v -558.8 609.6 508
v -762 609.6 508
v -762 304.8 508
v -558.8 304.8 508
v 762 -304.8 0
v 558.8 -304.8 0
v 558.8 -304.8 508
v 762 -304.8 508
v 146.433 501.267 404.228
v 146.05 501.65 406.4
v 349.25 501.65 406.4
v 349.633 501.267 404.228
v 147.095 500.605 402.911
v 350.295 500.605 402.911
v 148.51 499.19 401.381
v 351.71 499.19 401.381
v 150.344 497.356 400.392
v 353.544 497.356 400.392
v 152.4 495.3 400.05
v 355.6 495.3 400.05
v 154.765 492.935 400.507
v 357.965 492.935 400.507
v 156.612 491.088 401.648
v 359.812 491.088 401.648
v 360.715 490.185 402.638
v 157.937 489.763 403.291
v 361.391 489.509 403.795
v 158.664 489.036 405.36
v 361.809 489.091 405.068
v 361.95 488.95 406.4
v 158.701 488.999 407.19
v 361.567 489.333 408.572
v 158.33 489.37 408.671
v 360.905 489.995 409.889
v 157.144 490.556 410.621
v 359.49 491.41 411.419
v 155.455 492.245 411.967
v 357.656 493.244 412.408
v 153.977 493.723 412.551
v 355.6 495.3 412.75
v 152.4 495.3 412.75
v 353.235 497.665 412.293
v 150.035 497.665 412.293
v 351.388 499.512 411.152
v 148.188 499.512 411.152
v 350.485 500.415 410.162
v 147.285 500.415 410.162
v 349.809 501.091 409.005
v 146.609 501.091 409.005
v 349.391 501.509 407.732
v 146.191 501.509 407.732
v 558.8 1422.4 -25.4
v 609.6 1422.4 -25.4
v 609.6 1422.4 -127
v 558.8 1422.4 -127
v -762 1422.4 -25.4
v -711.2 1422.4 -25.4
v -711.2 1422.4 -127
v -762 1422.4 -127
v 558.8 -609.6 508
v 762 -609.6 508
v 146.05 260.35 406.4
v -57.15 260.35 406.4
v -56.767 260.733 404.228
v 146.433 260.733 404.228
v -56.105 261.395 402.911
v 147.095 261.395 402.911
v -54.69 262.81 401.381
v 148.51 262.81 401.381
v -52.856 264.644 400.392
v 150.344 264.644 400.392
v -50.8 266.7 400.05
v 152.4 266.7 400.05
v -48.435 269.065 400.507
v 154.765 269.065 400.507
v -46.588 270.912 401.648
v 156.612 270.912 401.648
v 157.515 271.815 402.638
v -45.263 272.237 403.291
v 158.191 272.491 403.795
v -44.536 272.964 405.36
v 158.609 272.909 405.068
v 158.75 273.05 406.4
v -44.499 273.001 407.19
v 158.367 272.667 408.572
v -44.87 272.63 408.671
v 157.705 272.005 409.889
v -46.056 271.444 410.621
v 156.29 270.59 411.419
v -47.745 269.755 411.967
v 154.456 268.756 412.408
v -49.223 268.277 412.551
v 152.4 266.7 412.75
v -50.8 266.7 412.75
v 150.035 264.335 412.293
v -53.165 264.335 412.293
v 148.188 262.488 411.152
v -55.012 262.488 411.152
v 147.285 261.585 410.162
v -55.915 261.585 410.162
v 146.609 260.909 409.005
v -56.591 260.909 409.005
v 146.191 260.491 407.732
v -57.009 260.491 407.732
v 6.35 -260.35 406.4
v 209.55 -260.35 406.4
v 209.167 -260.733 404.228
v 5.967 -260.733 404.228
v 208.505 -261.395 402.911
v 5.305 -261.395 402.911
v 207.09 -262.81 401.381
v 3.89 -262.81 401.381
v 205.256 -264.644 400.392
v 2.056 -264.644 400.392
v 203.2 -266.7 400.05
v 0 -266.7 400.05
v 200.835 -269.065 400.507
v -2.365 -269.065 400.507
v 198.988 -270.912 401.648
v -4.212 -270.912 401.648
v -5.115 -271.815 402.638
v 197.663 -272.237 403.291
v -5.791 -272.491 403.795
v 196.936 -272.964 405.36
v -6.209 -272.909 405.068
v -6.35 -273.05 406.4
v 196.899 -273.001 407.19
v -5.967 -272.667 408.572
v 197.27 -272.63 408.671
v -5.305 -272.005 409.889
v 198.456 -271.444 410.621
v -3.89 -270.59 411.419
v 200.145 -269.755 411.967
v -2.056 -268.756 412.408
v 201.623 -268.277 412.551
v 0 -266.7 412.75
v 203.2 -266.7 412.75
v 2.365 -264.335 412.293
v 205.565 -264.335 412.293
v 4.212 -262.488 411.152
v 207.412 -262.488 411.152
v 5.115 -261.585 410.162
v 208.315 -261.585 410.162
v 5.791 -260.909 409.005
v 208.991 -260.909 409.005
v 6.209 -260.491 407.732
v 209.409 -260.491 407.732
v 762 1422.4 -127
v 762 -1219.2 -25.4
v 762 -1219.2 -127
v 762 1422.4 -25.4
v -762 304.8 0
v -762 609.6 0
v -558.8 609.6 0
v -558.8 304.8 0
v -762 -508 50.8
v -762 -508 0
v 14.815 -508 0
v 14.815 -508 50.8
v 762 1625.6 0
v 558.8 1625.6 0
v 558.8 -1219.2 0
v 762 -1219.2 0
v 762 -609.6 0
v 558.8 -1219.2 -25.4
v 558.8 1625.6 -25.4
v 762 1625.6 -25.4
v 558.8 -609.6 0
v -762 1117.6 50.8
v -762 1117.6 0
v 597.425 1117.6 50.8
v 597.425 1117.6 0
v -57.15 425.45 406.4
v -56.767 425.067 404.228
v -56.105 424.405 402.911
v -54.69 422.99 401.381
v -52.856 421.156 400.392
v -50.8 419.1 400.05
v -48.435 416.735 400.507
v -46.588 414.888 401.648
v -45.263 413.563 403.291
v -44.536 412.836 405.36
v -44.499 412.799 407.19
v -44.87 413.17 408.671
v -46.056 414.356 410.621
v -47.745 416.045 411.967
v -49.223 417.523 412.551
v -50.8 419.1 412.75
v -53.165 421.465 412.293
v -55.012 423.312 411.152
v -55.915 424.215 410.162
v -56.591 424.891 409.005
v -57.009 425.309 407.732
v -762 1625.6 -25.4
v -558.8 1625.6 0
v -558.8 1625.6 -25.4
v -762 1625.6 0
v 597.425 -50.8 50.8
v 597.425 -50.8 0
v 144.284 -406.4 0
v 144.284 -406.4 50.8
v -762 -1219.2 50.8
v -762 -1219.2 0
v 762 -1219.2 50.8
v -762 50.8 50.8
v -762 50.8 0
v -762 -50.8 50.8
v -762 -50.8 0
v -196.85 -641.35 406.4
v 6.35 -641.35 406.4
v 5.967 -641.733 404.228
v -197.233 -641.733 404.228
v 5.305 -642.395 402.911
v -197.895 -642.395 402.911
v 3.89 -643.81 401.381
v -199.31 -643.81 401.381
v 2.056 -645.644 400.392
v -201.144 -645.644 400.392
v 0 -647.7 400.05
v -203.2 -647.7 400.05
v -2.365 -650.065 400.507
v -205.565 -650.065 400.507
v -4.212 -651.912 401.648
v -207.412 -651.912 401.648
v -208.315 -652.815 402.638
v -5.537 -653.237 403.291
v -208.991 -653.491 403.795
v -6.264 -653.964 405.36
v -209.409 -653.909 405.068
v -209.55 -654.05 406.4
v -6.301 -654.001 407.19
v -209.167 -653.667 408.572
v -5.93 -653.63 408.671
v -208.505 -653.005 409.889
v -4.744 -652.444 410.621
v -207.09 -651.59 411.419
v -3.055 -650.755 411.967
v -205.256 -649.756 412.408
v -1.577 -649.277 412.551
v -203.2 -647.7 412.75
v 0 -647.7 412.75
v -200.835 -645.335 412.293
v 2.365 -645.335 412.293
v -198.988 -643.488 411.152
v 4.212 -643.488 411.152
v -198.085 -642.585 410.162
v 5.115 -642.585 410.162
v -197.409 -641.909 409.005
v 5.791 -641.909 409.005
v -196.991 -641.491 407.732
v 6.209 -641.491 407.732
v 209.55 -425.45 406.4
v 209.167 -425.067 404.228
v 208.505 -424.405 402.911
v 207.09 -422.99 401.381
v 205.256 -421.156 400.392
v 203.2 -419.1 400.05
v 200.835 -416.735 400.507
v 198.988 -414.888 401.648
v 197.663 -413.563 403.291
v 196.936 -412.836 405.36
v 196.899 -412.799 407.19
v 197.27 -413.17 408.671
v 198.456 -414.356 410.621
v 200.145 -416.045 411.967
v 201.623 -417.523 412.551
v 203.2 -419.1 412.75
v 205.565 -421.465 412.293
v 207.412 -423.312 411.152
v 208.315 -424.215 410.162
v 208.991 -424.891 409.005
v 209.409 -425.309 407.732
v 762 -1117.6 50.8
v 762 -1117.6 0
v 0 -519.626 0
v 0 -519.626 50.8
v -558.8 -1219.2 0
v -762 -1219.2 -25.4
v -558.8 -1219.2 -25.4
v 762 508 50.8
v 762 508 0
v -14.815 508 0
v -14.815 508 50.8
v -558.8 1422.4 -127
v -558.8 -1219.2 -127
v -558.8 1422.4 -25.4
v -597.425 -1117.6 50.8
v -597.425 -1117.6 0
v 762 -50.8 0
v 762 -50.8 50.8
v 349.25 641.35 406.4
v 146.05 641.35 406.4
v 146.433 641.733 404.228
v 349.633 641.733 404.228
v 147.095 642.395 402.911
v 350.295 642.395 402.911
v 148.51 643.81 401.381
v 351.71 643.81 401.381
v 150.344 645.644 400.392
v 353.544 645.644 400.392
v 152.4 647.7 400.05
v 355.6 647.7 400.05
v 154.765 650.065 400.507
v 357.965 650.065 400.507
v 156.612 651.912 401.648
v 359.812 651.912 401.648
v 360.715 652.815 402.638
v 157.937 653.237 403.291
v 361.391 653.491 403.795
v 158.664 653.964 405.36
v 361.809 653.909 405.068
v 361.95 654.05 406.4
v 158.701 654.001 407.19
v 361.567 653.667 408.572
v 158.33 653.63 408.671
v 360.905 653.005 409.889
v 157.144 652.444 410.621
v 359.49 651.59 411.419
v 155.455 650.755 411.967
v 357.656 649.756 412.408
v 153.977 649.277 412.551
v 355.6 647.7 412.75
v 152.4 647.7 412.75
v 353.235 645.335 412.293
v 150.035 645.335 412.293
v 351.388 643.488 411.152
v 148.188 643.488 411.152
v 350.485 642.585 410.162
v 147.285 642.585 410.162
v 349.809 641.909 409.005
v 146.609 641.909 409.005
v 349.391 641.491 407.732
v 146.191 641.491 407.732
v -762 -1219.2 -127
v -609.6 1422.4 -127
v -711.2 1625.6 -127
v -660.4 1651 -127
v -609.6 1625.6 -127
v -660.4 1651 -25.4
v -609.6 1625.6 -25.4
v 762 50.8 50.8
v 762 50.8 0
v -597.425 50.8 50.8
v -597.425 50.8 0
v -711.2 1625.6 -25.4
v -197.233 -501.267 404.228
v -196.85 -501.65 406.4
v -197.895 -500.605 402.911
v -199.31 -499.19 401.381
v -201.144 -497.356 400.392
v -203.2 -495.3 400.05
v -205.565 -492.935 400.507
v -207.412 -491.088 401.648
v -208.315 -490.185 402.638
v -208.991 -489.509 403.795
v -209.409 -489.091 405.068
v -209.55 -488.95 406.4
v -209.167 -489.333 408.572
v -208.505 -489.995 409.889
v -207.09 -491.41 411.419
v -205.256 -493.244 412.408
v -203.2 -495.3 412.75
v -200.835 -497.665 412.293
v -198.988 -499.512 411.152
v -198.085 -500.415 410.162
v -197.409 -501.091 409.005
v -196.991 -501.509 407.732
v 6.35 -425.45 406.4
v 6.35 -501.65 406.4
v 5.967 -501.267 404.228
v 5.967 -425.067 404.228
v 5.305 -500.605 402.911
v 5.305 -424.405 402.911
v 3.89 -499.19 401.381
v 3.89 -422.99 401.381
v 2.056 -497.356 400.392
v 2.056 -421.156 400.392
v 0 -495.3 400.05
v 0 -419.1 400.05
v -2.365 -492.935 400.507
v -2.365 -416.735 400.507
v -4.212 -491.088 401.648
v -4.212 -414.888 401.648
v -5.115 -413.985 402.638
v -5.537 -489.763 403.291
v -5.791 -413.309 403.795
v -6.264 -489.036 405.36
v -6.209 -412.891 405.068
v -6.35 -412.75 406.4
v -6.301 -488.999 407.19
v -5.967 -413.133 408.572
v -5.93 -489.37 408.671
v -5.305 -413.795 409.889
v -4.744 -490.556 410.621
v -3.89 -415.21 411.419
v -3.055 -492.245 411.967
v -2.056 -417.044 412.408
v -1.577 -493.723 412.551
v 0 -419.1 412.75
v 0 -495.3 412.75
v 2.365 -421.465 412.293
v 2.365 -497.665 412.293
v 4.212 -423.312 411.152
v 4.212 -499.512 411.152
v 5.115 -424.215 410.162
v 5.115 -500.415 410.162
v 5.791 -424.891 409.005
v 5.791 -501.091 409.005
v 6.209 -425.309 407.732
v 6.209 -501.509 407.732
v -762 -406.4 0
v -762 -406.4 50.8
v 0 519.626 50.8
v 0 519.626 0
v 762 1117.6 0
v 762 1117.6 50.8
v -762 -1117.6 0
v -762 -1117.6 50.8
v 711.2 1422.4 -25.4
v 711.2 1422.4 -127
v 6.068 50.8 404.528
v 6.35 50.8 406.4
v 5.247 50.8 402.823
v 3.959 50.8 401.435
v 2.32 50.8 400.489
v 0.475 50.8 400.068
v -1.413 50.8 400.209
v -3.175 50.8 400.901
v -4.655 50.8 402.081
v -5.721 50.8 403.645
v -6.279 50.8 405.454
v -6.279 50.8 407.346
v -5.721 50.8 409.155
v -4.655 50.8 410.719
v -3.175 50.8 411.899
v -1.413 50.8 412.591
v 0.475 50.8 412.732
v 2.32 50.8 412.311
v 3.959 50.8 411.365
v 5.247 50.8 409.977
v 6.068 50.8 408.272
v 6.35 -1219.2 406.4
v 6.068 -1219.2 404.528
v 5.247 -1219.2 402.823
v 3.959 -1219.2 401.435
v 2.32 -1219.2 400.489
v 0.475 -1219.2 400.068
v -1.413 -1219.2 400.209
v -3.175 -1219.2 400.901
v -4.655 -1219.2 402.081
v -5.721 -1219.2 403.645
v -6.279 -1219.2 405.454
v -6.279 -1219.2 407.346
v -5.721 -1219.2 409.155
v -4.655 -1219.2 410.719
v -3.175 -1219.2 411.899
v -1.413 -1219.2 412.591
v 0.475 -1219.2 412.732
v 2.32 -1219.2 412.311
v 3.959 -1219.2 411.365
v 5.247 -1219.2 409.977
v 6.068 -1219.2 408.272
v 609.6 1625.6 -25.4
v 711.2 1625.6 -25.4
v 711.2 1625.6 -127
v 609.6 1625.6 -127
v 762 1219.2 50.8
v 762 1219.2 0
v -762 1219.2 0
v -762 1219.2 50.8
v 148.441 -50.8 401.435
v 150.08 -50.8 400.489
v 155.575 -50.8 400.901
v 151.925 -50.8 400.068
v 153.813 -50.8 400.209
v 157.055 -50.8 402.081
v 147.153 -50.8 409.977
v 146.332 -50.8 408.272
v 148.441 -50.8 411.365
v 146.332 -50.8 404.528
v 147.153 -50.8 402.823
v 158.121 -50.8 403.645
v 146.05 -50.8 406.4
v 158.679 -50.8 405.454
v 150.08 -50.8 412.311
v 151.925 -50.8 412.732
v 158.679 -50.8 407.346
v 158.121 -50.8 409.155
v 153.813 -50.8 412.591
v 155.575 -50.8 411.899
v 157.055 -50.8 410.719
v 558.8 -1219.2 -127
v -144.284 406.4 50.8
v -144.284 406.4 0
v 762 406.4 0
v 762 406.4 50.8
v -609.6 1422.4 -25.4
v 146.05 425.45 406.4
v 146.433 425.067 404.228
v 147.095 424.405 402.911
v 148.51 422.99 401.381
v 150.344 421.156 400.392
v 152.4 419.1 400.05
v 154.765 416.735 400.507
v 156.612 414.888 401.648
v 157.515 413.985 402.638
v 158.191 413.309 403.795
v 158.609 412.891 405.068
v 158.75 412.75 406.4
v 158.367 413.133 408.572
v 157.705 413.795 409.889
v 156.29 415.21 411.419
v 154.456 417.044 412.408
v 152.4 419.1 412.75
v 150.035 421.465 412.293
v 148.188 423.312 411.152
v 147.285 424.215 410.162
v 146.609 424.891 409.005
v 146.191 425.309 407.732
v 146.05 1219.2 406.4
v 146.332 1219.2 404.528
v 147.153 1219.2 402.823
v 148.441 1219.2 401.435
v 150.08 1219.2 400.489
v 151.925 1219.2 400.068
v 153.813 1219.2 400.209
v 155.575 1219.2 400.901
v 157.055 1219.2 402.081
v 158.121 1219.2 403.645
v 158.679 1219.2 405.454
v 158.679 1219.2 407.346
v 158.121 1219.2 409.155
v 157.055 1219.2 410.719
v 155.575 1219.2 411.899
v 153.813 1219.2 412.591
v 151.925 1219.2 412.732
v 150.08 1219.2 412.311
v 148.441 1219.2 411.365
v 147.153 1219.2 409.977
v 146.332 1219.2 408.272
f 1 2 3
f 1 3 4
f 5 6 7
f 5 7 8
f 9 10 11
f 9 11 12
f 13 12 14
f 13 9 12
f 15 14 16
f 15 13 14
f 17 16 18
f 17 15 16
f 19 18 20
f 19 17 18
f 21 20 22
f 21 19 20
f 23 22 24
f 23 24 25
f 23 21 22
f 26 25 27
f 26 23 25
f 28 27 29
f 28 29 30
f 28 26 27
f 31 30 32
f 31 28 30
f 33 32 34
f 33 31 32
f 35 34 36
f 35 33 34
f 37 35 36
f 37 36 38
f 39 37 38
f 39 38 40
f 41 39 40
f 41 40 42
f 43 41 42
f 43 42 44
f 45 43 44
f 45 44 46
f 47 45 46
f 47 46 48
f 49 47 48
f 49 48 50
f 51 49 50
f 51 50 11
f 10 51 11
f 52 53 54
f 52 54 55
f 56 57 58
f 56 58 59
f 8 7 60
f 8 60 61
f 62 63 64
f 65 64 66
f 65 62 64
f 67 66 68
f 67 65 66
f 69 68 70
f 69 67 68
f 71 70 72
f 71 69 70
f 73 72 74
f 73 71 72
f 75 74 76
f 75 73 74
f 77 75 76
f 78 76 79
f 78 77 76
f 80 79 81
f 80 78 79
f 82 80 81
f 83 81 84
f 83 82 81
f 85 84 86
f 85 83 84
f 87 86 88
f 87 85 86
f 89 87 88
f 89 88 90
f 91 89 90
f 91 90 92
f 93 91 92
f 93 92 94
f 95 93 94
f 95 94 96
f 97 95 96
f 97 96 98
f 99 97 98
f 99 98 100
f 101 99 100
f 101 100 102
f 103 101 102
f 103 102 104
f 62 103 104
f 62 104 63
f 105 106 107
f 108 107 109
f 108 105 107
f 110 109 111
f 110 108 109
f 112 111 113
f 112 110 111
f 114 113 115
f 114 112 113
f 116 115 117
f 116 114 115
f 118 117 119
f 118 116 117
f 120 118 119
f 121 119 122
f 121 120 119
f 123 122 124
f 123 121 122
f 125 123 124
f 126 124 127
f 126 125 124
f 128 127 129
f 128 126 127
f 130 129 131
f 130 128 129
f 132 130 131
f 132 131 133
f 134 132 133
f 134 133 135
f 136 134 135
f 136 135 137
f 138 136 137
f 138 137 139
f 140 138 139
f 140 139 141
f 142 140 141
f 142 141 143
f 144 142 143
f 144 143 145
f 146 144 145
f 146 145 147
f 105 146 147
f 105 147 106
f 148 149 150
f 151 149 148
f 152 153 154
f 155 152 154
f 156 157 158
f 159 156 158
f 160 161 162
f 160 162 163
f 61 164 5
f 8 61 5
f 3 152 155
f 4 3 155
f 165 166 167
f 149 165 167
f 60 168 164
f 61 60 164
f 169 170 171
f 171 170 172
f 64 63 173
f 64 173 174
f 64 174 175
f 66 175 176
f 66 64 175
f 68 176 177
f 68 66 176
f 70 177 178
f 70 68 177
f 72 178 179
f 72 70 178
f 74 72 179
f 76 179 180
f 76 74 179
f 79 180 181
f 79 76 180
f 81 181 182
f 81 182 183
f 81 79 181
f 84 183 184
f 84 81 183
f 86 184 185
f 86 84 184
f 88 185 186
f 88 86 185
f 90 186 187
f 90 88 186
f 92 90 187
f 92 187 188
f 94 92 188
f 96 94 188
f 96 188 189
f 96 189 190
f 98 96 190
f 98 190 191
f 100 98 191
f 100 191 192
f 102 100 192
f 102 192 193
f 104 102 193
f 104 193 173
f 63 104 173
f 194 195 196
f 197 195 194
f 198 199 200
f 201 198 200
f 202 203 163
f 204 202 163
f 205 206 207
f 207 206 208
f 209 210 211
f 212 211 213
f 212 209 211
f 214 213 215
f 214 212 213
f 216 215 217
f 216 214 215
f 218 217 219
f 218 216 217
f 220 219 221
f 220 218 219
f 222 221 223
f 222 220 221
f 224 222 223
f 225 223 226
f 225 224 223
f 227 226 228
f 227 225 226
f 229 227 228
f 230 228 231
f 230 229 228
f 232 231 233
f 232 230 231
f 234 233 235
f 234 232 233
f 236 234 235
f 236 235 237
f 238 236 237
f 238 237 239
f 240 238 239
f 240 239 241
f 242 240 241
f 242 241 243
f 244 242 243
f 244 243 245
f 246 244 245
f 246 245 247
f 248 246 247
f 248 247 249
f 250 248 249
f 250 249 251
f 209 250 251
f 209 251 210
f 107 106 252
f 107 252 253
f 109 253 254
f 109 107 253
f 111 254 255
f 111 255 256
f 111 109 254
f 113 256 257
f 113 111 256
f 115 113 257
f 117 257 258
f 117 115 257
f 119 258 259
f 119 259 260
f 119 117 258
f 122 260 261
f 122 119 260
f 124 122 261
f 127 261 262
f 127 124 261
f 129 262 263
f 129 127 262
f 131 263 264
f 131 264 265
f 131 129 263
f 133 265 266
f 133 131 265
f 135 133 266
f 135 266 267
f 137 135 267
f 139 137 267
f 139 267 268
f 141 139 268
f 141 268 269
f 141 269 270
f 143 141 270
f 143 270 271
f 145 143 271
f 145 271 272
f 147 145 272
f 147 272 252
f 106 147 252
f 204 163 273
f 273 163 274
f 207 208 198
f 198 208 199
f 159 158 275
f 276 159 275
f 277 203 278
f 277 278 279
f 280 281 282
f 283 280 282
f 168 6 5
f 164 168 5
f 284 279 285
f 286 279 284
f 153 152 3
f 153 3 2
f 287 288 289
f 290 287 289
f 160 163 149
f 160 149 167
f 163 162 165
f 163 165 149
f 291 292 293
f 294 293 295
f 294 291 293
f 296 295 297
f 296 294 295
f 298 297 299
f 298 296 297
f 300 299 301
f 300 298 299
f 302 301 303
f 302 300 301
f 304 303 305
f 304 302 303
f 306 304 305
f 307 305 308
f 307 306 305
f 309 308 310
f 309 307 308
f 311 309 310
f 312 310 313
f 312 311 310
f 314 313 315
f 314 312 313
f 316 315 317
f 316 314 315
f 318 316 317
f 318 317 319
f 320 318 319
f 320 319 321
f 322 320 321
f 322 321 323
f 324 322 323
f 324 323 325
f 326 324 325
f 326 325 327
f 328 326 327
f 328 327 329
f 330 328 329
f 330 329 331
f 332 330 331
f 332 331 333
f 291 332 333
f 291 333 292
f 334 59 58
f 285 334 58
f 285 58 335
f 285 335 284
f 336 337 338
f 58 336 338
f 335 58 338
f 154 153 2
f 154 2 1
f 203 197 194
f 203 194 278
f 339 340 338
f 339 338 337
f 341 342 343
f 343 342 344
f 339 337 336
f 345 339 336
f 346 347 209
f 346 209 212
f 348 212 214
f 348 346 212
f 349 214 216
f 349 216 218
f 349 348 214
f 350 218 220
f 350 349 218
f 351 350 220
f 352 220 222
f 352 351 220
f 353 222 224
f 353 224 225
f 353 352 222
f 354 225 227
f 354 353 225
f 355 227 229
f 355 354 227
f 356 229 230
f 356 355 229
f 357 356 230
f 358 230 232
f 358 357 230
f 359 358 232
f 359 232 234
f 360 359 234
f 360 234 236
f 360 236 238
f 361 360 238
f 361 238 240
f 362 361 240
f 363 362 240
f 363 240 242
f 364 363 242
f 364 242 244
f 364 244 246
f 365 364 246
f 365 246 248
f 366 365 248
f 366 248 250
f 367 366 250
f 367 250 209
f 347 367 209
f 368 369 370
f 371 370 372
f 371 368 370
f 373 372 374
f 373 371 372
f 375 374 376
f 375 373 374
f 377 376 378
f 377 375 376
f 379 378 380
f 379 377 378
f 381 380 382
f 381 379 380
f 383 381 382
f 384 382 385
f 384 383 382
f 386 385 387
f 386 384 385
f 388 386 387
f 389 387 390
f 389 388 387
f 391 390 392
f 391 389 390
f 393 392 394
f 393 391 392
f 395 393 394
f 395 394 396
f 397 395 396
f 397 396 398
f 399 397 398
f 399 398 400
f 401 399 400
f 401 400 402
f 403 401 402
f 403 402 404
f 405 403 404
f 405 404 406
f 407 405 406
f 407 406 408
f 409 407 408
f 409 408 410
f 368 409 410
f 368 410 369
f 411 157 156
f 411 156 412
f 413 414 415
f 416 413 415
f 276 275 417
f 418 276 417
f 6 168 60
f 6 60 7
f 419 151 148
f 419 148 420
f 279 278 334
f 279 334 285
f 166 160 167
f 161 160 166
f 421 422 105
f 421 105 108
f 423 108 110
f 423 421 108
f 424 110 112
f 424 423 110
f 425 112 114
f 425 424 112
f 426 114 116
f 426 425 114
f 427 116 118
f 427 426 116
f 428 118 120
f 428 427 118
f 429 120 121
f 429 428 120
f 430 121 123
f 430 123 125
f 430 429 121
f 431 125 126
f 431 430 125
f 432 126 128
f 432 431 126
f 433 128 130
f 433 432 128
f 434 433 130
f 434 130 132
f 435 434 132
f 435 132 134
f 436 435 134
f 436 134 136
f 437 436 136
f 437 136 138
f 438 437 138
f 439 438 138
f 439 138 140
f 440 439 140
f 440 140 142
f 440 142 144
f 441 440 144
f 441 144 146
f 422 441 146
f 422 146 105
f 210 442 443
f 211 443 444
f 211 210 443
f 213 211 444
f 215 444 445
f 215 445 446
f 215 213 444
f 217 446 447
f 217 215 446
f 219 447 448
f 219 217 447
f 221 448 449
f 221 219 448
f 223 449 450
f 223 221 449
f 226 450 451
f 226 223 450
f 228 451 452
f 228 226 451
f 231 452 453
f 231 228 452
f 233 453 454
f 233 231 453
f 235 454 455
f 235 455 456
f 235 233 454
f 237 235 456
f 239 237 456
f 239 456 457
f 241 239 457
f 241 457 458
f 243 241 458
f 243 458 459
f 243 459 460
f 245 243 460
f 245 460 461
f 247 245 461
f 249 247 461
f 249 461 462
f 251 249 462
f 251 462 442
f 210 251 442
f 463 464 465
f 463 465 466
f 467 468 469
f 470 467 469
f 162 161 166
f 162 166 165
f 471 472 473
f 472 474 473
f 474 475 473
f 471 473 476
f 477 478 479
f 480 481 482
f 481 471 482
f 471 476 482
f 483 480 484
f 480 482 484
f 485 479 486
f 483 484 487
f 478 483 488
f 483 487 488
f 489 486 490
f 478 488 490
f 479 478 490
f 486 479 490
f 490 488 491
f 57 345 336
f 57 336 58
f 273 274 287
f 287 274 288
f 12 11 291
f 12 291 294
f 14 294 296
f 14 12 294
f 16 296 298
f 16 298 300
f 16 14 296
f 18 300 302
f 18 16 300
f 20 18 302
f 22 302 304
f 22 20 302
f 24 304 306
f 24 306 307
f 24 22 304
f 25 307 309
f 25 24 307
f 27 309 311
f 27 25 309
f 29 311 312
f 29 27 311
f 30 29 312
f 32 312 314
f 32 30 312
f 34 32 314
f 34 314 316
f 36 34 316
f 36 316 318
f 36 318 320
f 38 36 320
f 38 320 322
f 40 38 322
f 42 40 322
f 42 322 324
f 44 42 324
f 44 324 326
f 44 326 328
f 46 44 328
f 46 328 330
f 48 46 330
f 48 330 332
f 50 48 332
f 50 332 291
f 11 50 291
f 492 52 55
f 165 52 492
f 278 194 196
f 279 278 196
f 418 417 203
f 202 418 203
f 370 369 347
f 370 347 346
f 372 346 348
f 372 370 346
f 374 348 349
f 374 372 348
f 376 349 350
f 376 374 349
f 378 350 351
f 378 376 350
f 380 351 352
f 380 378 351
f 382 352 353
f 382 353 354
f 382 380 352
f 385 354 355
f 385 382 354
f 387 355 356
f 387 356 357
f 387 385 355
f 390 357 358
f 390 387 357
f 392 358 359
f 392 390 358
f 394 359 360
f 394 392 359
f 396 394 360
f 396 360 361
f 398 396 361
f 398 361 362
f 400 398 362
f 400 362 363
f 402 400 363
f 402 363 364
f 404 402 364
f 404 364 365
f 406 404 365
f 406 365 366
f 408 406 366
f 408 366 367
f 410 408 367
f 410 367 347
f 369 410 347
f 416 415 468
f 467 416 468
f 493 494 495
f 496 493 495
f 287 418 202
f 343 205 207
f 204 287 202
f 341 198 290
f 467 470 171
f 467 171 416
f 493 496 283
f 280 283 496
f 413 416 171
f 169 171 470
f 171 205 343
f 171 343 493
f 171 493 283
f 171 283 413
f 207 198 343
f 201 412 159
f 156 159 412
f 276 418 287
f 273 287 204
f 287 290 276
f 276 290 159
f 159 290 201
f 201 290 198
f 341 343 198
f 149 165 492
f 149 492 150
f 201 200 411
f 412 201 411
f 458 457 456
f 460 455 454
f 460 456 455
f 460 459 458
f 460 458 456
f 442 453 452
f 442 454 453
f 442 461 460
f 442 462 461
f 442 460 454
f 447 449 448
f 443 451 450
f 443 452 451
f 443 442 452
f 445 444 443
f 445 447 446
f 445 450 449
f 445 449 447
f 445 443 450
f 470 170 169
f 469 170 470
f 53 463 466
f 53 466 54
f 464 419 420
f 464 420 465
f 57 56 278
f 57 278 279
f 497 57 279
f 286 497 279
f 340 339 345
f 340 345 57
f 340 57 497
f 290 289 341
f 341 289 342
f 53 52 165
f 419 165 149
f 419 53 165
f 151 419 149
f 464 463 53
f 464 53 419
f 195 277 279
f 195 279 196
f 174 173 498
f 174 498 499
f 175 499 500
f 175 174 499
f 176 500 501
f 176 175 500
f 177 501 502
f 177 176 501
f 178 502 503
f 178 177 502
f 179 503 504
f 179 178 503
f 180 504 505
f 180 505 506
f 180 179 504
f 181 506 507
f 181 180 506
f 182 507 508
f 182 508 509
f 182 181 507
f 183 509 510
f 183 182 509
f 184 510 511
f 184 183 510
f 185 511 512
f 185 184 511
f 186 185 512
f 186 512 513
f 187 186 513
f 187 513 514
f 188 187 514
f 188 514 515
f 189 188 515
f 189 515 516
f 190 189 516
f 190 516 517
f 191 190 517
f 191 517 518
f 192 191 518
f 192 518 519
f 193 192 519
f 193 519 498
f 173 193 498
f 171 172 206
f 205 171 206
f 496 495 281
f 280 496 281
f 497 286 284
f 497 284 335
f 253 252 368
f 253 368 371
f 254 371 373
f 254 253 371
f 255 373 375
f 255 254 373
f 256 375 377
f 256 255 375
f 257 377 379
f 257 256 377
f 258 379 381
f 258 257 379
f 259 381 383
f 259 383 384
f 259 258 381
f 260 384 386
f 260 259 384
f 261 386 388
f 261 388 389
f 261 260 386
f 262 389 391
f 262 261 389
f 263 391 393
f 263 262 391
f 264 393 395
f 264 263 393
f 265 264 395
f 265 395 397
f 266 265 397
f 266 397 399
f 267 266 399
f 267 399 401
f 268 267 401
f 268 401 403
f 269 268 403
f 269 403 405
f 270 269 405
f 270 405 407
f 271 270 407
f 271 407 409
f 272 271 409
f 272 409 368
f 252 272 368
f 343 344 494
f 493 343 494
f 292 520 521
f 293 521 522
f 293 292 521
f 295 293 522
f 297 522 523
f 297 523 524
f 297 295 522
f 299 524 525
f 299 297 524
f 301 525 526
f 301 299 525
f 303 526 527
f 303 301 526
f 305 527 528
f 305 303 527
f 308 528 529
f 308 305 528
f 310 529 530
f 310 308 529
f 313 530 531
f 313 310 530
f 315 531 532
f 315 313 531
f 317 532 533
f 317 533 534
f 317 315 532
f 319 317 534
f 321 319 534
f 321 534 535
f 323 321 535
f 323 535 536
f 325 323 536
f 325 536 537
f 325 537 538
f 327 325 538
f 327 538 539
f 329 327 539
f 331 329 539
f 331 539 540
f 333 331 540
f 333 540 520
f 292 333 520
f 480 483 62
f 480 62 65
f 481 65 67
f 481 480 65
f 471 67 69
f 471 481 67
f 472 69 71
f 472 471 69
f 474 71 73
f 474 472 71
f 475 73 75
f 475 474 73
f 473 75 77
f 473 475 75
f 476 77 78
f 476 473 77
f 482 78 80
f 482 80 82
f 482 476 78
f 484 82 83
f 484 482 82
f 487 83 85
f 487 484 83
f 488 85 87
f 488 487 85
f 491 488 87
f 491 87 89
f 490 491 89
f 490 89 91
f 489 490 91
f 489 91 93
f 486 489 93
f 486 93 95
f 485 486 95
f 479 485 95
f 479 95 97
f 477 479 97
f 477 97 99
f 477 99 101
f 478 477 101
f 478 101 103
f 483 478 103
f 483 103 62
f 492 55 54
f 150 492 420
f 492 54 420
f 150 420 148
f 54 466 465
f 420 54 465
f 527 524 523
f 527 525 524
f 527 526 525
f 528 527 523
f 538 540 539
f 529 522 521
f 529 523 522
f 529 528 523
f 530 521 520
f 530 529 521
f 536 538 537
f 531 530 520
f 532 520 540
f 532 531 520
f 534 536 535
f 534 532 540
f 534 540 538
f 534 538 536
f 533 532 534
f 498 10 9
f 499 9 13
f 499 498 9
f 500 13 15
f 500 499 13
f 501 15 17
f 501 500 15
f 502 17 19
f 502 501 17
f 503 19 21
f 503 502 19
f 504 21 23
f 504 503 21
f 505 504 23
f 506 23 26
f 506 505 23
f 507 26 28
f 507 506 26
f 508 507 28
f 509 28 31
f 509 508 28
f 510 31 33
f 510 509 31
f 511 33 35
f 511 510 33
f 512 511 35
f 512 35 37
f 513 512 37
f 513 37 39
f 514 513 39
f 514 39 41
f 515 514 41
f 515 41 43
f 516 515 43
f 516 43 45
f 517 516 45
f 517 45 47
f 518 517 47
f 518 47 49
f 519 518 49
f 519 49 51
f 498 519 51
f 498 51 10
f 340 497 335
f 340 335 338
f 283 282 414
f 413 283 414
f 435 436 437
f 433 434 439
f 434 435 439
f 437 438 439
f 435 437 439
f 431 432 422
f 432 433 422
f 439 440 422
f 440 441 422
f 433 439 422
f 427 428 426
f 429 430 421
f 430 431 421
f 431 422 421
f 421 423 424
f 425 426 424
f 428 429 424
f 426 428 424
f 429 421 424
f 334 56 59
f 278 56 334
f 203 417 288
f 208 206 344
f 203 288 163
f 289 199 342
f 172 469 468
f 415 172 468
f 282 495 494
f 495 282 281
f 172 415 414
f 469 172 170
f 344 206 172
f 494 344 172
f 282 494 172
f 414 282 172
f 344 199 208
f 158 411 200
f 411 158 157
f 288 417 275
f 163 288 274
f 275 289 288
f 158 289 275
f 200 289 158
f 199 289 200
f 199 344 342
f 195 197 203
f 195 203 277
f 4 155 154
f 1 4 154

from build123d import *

# Parameters (mm, degrees)
F2_START = -25.4
F1_W     = 203.2
F1_H     = 304.8
F1_H_2   = 1524
F2_DEPTH = 101.6
F1_H_3   = 609.6
F3_DEPTH = 508
F4_DEPTH = 508
F1_W_2   = 50.8
F1_H_4   = 203.2
F6_DEPTH = 25.4
F7_W     = 558.8
F7_H     = 101.6
F7_W_2   = 203.2
F8_DEPTH = 50.8
F12_R    = 6.35
F14_R    = 6.35


with BuildPart() as f2:
    # F1 (on Top) → F2 (new body)
    with BuildSketch(Plane.XY.offset(F2_START)):
        Polygon((-762, 1422.4), (-762, 1219.2), (-660.4, 1219.2), (-660.4, 1422.4), (-711.2, 1422.4), align=None)
        Polygon((-660.4, 1219.2), (-762, 1219.2), (-762, 609.6), (-558.8, 609.6), (-558.8, 1219.2), align=None)
        Polygon((-660.4, 1422.4), (-660.4, 1219.2), (-558.8, 1219.2), (-558.8, 1422.4), (-609.6, 1422.4), align=None)
        with Locations((-660.4, 457.2)):
            Rectangle(F1_W, F1_H)
        Polygon((-711.2, 1422.4), (-660.4, 1422.4), (-609.6, 1422.4), (-609.6, 1625.6), (-711.2, 1625.6), align=None)
        with Locations((-660.4, -457.2)):
            Rectangle(F1_W, F1_H_2)
        Polygon((-660.4, 1651), (-711.2, 1625.6), (-609.6, 1625.6), align=None)
    extrude(amount=-F2_DEPTH)


with BuildPart() as f2b:
    # F1 (on Top) → F2, piece 2 (new body)
    with BuildSketch(Plane.XY.offset(F2_START)):
        Polygon((660.4, 1219.2), (558.8, 1219.2), (558.8, -304.8), (762, -304.8), (762, 1219.2), align=None)
        Polygon((558.8, 1422.4), (558.8, 1219.2), (660.4, 1219.2), (660.4, 1422.4), (609.6, 1422.4), align=None)
        with Locations((660.4, -457.2)):
            Rectangle(F1_W, F1_H)
        Polygon((660.4, 1422.4), (660.4, 1219.2), (762, 1219.2), (762, 1422.4), (711.2, 1422.4), align=None)
        with Locations((660.4, -914.4)):
            Rectangle(F1_W, F1_H_3)
        Polygon((609.6, 1422.4), (660.4, 1422.4), (711.2, 1422.4), (711.2, 1625.6), (609.6, 1625.6), align=None)
    extrude(amount=-F2_DEPTH)


with BuildPart() as f3:
    # F1 (on Top) → F3 (new body)
    with BuildSketch(Plane.XY):
        with Locations((-660.4, 457.2)):
            Rectangle(F1_W, F1_H)
    extrude(amount=F3_DEPTH)


with BuildPart() as f4:
    # F1 (on Top) → F4 (new body)
    with BuildSketch(Plane.XY):
        with Locations((660.4, -457.2)):
            Rectangle(F1_W, F1_H)
    extrude(amount=F4_DEPTH)


with BuildPart() as f6:
    # F1 (on Top) → F6 (new body)
    with BuildSketch(Plane.XY):
        with Locations((-736.6, 1524)):
            Rectangle(F1_W_2, F1_H_4)
        Polygon((-711.2, 1422.4), (-660.4, 1422.4), (-609.6, 1422.4), (-609.6, 1625.6), (-711.2, 1625.6), align=None)
        with Locations((-584.2, 1524)):
            Rectangle(F1_W_2, F1_H_4)
        Polygon((-660.4, 1422.4), (-660.4, 1219.2), (-558.8, 1219.2), (-558.8, 1422.4), (-609.6, 1422.4), align=None)
        Polygon((-762, 1422.4), (-762, 1219.2), (-660.4, 1219.2), (-660.4, 1422.4), (-711.2, 1422.4), align=None)
        Polygon((-660.4, 1219.2), (-762, 1219.2), (-762, 609.6), (-558.8, 609.6), (-558.8, 1219.2), align=None)
        with Locations((-660.4, -457.2)):
            Rectangle(F1_W, F1_H_2)
        with Locations((-660.4, 457.2)):
            Rectangle(F1_W, F1_H)
    extrude(amount=-F6_DEPTH)


with BuildPart() as f6b:
    # F1 (on Top) → F6, piece 2 (new body)
    with BuildSketch(Plane.XY):
        Polygon((660.4, 1219.2), (558.8, 1219.2), (558.8, -304.8), (762, -304.8), (762, 1219.2), align=None)
        with Locations((660.4, -914.4)):
            Rectangle(F1_W, F1_H_3)
        with Locations((584.2, 1524)):
            Rectangle(F1_W_2, F1_H_4)
        Polygon((609.6, 1422.4), (660.4, 1422.4), (711.2, 1422.4), (711.2, 1625.6), (609.6, 1625.6), align=None)
        with Locations((736.6, 1524)):
            Rectangle(F1_W_2, F1_H_4)
        Polygon((660.4, 1422.4), (660.4, 1219.2), (762, 1219.2), (762, 1422.4), (711.2, 1422.4), align=None)
        Polygon((558.8, 1422.4), (558.8, 1219.2), (660.4, 1219.2), (660.4, 1422.4), (609.6, 1422.4), align=None)
        with Locations((660.4, -457.2)):
            Rectangle(F1_W, F1_H)
    extrude(amount=-F6_DEPTH)


with BuildPart() as f8:
    # F7 (on Top) → F8 (new body)
    with BuildSketch(Plane.XY):
        Polygon((0, 648.7744153468), (-558.8, 210.2598440925), (-558.8, 81.111013399), (-144.2835902197, 406.4), (-14.8145059026, 508), (0, 519.6255846532), align=None)
        Polygon((-558.8, 210.2598440925), (-762, 50.8), (-597.4253853296, 50.8), (-558.8, 81.111013399), align=None)
        Polygon((558.8, 1087.288986601), (0, 648.7744153468), (0, 519.6255846532), (558.8, 958.1401559075), align=None)
        Polygon((597.4253853296, 1117.6), (558.8, 1087.288986601), (558.8, 958.1401559075), (762, 1117.6), align=None)
        Polygon((762, 1219.2), (558.8, 1219.2), (558.8, 1117.6), (597.4253853296, 1117.6), (762, 1117.6), align=None)
        with Locations((279.4, 1168.4)):
            Rectangle(F7_W, F7_H)
        with Locations((-279.4, 1168.4)):
            Rectangle(F7_W, F7_H)
        with Locations((-660.4, 1168.4)):
            Rectangle(F7_W_2, F7_H)
        with Locations((-279.4, 0)):
            Rectangle(F7_W, F7_H)
        Polygon((-597.4253853296, 50.8), (-762, 50.8), (-762, -50.8), (-558.8, -50.8), (-558.8, 50.8), align=None)
        with Locations((279.4, 0)):
            Rectangle(F7_W, F7_H)
        Polygon((558.8, 50.8), (558.8, -50.8), (597.4253853296, -50.8), (762, -50.8), (762, 50.8), align=None)
        Polygon((558.8, -81.111013399), (144.2835902197, -406.4), (14.8145059026, -508), (0, -519.6255846533), (0, -648.7744153467), (558.8, -210.2598440925), align=None)
        Polygon((597.4253853296, -50.8), (558.8, -81.111013399), (558.8, -210.2598440925), (762, -50.8), align=None)
        Polygon((0, -519.6255846533), (-558.8, -958.1401559075), (-558.8, -1087.288986601), (0, -648.7744153467), align=None)
        Polygon((-558.8, -958.1401559075), (-762, -1117.6), (-597.4253853296, -1117.6), (-558.8, -1087.288986601), align=None)
        with Locations((-279.4, -1168.4)):
            Rectangle(F7_W, F7_H)
        Polygon((-597.4253853296, -1117.6), (-762, -1117.6), (-762, -1219.2), (-558.8, -1219.2), (-558.8, -1117.6), align=None)
        with Locations((279.4, -1168.4)):
            Rectangle(F7_W, F7_H)
        with Locations((660.4, -1168.4)):
            Rectangle(F7_W_2, F7_H)
        with Locations((-279.4, -457.2)):
            Rectangle(F7_W, F7_H)
        with Locations((-660.4, -457.2)):
            Rectangle(F7_W_2, F7_H)
        Polygon((144.2835902197, -406.4), (0, -406.4), (0, -508), (14.8145059026, -508), align=None)
        Polygon((-14.8145059026, 508), (-144.2835902197, 406.4), (0, 406.4), (0, 508), align=None)
        with Locations((660.4, 457.2)):
            Rectangle(F7_W_2, F7_H)
        with Locations((279.4, 457.2)):
            Rectangle(F7_W, F7_H)
    extrude(amount=F8_DEPTH)


with BuildPart() as f13:
    # F13: sweep along a path in F5
    with BuildLine(Plane.XY.offset(406.4)) as f13_path:
        Line((152.4, 1219.2), (152.4, 647.7))
        Line((152.4, 647.7), (355.6, 647.7))
        Line((355.6, 647.7), (355.6, 495.3))
        Line((355.6, 495.3), (152.4, 495.3))
        Line((152.4, 495.3), (152.4, 419.1))
        Line((152.4, 419.1), (-50.8, 419.1))
        Line((-50.8, 419.1), (-50.8, 266.7))
        Line((-50.8, 266.7), (152.4, 266.7))
        Line((152.4, 266.7), (152.4, -50.8))
    # F12 (on offset) → F13 (sweep)
    with BuildSketch(Plane(origin=(0, 1219.2, 0), x_dir=(-1, 0, 0), z_dir=(0, 1, 0))):
        with Locations((-152.4, 406.4)):
            Circle(F12_R)
    sweep(path=f13_path.line, transition=Transition.RIGHT)


with BuildPart() as f15:
    # F15: sweep along a path in F5
    with BuildLine(Plane.XY.offset(406.4)) as f15_path:
        Line((0, -1219.2), (0, -647.7))
        Line((0, -647.7), (-203.2, -647.7))
        Line((-203.2, -647.7), (-203.2, -495.3))
        Line((-203.2, -495.3), (0, -495.3))
        Line((0, -495.3), (0, -419.1))
        Line((0, -419.1), (203.2, -419.1))
        Line((203.2, -419.1), (203.2, -266.7))
        Line((203.2, -266.7), (0, -266.7))
        Line((0, -266.7), (0, 50.8))
    # F14 (on offset) → F15 (sweep)
    with BuildSketch(Plane.XZ.offset(1219.2)):
        with Locations((0, 406.4)):
            Circle(F14_R)
    sweep(path=f15_path.line, transition=Transition.RIGHT)


solid = Compound([f2.part, f2b.part, f3.part, f4.part, f6.part, f6b.part, f8.part, f13.part, f15.part])
